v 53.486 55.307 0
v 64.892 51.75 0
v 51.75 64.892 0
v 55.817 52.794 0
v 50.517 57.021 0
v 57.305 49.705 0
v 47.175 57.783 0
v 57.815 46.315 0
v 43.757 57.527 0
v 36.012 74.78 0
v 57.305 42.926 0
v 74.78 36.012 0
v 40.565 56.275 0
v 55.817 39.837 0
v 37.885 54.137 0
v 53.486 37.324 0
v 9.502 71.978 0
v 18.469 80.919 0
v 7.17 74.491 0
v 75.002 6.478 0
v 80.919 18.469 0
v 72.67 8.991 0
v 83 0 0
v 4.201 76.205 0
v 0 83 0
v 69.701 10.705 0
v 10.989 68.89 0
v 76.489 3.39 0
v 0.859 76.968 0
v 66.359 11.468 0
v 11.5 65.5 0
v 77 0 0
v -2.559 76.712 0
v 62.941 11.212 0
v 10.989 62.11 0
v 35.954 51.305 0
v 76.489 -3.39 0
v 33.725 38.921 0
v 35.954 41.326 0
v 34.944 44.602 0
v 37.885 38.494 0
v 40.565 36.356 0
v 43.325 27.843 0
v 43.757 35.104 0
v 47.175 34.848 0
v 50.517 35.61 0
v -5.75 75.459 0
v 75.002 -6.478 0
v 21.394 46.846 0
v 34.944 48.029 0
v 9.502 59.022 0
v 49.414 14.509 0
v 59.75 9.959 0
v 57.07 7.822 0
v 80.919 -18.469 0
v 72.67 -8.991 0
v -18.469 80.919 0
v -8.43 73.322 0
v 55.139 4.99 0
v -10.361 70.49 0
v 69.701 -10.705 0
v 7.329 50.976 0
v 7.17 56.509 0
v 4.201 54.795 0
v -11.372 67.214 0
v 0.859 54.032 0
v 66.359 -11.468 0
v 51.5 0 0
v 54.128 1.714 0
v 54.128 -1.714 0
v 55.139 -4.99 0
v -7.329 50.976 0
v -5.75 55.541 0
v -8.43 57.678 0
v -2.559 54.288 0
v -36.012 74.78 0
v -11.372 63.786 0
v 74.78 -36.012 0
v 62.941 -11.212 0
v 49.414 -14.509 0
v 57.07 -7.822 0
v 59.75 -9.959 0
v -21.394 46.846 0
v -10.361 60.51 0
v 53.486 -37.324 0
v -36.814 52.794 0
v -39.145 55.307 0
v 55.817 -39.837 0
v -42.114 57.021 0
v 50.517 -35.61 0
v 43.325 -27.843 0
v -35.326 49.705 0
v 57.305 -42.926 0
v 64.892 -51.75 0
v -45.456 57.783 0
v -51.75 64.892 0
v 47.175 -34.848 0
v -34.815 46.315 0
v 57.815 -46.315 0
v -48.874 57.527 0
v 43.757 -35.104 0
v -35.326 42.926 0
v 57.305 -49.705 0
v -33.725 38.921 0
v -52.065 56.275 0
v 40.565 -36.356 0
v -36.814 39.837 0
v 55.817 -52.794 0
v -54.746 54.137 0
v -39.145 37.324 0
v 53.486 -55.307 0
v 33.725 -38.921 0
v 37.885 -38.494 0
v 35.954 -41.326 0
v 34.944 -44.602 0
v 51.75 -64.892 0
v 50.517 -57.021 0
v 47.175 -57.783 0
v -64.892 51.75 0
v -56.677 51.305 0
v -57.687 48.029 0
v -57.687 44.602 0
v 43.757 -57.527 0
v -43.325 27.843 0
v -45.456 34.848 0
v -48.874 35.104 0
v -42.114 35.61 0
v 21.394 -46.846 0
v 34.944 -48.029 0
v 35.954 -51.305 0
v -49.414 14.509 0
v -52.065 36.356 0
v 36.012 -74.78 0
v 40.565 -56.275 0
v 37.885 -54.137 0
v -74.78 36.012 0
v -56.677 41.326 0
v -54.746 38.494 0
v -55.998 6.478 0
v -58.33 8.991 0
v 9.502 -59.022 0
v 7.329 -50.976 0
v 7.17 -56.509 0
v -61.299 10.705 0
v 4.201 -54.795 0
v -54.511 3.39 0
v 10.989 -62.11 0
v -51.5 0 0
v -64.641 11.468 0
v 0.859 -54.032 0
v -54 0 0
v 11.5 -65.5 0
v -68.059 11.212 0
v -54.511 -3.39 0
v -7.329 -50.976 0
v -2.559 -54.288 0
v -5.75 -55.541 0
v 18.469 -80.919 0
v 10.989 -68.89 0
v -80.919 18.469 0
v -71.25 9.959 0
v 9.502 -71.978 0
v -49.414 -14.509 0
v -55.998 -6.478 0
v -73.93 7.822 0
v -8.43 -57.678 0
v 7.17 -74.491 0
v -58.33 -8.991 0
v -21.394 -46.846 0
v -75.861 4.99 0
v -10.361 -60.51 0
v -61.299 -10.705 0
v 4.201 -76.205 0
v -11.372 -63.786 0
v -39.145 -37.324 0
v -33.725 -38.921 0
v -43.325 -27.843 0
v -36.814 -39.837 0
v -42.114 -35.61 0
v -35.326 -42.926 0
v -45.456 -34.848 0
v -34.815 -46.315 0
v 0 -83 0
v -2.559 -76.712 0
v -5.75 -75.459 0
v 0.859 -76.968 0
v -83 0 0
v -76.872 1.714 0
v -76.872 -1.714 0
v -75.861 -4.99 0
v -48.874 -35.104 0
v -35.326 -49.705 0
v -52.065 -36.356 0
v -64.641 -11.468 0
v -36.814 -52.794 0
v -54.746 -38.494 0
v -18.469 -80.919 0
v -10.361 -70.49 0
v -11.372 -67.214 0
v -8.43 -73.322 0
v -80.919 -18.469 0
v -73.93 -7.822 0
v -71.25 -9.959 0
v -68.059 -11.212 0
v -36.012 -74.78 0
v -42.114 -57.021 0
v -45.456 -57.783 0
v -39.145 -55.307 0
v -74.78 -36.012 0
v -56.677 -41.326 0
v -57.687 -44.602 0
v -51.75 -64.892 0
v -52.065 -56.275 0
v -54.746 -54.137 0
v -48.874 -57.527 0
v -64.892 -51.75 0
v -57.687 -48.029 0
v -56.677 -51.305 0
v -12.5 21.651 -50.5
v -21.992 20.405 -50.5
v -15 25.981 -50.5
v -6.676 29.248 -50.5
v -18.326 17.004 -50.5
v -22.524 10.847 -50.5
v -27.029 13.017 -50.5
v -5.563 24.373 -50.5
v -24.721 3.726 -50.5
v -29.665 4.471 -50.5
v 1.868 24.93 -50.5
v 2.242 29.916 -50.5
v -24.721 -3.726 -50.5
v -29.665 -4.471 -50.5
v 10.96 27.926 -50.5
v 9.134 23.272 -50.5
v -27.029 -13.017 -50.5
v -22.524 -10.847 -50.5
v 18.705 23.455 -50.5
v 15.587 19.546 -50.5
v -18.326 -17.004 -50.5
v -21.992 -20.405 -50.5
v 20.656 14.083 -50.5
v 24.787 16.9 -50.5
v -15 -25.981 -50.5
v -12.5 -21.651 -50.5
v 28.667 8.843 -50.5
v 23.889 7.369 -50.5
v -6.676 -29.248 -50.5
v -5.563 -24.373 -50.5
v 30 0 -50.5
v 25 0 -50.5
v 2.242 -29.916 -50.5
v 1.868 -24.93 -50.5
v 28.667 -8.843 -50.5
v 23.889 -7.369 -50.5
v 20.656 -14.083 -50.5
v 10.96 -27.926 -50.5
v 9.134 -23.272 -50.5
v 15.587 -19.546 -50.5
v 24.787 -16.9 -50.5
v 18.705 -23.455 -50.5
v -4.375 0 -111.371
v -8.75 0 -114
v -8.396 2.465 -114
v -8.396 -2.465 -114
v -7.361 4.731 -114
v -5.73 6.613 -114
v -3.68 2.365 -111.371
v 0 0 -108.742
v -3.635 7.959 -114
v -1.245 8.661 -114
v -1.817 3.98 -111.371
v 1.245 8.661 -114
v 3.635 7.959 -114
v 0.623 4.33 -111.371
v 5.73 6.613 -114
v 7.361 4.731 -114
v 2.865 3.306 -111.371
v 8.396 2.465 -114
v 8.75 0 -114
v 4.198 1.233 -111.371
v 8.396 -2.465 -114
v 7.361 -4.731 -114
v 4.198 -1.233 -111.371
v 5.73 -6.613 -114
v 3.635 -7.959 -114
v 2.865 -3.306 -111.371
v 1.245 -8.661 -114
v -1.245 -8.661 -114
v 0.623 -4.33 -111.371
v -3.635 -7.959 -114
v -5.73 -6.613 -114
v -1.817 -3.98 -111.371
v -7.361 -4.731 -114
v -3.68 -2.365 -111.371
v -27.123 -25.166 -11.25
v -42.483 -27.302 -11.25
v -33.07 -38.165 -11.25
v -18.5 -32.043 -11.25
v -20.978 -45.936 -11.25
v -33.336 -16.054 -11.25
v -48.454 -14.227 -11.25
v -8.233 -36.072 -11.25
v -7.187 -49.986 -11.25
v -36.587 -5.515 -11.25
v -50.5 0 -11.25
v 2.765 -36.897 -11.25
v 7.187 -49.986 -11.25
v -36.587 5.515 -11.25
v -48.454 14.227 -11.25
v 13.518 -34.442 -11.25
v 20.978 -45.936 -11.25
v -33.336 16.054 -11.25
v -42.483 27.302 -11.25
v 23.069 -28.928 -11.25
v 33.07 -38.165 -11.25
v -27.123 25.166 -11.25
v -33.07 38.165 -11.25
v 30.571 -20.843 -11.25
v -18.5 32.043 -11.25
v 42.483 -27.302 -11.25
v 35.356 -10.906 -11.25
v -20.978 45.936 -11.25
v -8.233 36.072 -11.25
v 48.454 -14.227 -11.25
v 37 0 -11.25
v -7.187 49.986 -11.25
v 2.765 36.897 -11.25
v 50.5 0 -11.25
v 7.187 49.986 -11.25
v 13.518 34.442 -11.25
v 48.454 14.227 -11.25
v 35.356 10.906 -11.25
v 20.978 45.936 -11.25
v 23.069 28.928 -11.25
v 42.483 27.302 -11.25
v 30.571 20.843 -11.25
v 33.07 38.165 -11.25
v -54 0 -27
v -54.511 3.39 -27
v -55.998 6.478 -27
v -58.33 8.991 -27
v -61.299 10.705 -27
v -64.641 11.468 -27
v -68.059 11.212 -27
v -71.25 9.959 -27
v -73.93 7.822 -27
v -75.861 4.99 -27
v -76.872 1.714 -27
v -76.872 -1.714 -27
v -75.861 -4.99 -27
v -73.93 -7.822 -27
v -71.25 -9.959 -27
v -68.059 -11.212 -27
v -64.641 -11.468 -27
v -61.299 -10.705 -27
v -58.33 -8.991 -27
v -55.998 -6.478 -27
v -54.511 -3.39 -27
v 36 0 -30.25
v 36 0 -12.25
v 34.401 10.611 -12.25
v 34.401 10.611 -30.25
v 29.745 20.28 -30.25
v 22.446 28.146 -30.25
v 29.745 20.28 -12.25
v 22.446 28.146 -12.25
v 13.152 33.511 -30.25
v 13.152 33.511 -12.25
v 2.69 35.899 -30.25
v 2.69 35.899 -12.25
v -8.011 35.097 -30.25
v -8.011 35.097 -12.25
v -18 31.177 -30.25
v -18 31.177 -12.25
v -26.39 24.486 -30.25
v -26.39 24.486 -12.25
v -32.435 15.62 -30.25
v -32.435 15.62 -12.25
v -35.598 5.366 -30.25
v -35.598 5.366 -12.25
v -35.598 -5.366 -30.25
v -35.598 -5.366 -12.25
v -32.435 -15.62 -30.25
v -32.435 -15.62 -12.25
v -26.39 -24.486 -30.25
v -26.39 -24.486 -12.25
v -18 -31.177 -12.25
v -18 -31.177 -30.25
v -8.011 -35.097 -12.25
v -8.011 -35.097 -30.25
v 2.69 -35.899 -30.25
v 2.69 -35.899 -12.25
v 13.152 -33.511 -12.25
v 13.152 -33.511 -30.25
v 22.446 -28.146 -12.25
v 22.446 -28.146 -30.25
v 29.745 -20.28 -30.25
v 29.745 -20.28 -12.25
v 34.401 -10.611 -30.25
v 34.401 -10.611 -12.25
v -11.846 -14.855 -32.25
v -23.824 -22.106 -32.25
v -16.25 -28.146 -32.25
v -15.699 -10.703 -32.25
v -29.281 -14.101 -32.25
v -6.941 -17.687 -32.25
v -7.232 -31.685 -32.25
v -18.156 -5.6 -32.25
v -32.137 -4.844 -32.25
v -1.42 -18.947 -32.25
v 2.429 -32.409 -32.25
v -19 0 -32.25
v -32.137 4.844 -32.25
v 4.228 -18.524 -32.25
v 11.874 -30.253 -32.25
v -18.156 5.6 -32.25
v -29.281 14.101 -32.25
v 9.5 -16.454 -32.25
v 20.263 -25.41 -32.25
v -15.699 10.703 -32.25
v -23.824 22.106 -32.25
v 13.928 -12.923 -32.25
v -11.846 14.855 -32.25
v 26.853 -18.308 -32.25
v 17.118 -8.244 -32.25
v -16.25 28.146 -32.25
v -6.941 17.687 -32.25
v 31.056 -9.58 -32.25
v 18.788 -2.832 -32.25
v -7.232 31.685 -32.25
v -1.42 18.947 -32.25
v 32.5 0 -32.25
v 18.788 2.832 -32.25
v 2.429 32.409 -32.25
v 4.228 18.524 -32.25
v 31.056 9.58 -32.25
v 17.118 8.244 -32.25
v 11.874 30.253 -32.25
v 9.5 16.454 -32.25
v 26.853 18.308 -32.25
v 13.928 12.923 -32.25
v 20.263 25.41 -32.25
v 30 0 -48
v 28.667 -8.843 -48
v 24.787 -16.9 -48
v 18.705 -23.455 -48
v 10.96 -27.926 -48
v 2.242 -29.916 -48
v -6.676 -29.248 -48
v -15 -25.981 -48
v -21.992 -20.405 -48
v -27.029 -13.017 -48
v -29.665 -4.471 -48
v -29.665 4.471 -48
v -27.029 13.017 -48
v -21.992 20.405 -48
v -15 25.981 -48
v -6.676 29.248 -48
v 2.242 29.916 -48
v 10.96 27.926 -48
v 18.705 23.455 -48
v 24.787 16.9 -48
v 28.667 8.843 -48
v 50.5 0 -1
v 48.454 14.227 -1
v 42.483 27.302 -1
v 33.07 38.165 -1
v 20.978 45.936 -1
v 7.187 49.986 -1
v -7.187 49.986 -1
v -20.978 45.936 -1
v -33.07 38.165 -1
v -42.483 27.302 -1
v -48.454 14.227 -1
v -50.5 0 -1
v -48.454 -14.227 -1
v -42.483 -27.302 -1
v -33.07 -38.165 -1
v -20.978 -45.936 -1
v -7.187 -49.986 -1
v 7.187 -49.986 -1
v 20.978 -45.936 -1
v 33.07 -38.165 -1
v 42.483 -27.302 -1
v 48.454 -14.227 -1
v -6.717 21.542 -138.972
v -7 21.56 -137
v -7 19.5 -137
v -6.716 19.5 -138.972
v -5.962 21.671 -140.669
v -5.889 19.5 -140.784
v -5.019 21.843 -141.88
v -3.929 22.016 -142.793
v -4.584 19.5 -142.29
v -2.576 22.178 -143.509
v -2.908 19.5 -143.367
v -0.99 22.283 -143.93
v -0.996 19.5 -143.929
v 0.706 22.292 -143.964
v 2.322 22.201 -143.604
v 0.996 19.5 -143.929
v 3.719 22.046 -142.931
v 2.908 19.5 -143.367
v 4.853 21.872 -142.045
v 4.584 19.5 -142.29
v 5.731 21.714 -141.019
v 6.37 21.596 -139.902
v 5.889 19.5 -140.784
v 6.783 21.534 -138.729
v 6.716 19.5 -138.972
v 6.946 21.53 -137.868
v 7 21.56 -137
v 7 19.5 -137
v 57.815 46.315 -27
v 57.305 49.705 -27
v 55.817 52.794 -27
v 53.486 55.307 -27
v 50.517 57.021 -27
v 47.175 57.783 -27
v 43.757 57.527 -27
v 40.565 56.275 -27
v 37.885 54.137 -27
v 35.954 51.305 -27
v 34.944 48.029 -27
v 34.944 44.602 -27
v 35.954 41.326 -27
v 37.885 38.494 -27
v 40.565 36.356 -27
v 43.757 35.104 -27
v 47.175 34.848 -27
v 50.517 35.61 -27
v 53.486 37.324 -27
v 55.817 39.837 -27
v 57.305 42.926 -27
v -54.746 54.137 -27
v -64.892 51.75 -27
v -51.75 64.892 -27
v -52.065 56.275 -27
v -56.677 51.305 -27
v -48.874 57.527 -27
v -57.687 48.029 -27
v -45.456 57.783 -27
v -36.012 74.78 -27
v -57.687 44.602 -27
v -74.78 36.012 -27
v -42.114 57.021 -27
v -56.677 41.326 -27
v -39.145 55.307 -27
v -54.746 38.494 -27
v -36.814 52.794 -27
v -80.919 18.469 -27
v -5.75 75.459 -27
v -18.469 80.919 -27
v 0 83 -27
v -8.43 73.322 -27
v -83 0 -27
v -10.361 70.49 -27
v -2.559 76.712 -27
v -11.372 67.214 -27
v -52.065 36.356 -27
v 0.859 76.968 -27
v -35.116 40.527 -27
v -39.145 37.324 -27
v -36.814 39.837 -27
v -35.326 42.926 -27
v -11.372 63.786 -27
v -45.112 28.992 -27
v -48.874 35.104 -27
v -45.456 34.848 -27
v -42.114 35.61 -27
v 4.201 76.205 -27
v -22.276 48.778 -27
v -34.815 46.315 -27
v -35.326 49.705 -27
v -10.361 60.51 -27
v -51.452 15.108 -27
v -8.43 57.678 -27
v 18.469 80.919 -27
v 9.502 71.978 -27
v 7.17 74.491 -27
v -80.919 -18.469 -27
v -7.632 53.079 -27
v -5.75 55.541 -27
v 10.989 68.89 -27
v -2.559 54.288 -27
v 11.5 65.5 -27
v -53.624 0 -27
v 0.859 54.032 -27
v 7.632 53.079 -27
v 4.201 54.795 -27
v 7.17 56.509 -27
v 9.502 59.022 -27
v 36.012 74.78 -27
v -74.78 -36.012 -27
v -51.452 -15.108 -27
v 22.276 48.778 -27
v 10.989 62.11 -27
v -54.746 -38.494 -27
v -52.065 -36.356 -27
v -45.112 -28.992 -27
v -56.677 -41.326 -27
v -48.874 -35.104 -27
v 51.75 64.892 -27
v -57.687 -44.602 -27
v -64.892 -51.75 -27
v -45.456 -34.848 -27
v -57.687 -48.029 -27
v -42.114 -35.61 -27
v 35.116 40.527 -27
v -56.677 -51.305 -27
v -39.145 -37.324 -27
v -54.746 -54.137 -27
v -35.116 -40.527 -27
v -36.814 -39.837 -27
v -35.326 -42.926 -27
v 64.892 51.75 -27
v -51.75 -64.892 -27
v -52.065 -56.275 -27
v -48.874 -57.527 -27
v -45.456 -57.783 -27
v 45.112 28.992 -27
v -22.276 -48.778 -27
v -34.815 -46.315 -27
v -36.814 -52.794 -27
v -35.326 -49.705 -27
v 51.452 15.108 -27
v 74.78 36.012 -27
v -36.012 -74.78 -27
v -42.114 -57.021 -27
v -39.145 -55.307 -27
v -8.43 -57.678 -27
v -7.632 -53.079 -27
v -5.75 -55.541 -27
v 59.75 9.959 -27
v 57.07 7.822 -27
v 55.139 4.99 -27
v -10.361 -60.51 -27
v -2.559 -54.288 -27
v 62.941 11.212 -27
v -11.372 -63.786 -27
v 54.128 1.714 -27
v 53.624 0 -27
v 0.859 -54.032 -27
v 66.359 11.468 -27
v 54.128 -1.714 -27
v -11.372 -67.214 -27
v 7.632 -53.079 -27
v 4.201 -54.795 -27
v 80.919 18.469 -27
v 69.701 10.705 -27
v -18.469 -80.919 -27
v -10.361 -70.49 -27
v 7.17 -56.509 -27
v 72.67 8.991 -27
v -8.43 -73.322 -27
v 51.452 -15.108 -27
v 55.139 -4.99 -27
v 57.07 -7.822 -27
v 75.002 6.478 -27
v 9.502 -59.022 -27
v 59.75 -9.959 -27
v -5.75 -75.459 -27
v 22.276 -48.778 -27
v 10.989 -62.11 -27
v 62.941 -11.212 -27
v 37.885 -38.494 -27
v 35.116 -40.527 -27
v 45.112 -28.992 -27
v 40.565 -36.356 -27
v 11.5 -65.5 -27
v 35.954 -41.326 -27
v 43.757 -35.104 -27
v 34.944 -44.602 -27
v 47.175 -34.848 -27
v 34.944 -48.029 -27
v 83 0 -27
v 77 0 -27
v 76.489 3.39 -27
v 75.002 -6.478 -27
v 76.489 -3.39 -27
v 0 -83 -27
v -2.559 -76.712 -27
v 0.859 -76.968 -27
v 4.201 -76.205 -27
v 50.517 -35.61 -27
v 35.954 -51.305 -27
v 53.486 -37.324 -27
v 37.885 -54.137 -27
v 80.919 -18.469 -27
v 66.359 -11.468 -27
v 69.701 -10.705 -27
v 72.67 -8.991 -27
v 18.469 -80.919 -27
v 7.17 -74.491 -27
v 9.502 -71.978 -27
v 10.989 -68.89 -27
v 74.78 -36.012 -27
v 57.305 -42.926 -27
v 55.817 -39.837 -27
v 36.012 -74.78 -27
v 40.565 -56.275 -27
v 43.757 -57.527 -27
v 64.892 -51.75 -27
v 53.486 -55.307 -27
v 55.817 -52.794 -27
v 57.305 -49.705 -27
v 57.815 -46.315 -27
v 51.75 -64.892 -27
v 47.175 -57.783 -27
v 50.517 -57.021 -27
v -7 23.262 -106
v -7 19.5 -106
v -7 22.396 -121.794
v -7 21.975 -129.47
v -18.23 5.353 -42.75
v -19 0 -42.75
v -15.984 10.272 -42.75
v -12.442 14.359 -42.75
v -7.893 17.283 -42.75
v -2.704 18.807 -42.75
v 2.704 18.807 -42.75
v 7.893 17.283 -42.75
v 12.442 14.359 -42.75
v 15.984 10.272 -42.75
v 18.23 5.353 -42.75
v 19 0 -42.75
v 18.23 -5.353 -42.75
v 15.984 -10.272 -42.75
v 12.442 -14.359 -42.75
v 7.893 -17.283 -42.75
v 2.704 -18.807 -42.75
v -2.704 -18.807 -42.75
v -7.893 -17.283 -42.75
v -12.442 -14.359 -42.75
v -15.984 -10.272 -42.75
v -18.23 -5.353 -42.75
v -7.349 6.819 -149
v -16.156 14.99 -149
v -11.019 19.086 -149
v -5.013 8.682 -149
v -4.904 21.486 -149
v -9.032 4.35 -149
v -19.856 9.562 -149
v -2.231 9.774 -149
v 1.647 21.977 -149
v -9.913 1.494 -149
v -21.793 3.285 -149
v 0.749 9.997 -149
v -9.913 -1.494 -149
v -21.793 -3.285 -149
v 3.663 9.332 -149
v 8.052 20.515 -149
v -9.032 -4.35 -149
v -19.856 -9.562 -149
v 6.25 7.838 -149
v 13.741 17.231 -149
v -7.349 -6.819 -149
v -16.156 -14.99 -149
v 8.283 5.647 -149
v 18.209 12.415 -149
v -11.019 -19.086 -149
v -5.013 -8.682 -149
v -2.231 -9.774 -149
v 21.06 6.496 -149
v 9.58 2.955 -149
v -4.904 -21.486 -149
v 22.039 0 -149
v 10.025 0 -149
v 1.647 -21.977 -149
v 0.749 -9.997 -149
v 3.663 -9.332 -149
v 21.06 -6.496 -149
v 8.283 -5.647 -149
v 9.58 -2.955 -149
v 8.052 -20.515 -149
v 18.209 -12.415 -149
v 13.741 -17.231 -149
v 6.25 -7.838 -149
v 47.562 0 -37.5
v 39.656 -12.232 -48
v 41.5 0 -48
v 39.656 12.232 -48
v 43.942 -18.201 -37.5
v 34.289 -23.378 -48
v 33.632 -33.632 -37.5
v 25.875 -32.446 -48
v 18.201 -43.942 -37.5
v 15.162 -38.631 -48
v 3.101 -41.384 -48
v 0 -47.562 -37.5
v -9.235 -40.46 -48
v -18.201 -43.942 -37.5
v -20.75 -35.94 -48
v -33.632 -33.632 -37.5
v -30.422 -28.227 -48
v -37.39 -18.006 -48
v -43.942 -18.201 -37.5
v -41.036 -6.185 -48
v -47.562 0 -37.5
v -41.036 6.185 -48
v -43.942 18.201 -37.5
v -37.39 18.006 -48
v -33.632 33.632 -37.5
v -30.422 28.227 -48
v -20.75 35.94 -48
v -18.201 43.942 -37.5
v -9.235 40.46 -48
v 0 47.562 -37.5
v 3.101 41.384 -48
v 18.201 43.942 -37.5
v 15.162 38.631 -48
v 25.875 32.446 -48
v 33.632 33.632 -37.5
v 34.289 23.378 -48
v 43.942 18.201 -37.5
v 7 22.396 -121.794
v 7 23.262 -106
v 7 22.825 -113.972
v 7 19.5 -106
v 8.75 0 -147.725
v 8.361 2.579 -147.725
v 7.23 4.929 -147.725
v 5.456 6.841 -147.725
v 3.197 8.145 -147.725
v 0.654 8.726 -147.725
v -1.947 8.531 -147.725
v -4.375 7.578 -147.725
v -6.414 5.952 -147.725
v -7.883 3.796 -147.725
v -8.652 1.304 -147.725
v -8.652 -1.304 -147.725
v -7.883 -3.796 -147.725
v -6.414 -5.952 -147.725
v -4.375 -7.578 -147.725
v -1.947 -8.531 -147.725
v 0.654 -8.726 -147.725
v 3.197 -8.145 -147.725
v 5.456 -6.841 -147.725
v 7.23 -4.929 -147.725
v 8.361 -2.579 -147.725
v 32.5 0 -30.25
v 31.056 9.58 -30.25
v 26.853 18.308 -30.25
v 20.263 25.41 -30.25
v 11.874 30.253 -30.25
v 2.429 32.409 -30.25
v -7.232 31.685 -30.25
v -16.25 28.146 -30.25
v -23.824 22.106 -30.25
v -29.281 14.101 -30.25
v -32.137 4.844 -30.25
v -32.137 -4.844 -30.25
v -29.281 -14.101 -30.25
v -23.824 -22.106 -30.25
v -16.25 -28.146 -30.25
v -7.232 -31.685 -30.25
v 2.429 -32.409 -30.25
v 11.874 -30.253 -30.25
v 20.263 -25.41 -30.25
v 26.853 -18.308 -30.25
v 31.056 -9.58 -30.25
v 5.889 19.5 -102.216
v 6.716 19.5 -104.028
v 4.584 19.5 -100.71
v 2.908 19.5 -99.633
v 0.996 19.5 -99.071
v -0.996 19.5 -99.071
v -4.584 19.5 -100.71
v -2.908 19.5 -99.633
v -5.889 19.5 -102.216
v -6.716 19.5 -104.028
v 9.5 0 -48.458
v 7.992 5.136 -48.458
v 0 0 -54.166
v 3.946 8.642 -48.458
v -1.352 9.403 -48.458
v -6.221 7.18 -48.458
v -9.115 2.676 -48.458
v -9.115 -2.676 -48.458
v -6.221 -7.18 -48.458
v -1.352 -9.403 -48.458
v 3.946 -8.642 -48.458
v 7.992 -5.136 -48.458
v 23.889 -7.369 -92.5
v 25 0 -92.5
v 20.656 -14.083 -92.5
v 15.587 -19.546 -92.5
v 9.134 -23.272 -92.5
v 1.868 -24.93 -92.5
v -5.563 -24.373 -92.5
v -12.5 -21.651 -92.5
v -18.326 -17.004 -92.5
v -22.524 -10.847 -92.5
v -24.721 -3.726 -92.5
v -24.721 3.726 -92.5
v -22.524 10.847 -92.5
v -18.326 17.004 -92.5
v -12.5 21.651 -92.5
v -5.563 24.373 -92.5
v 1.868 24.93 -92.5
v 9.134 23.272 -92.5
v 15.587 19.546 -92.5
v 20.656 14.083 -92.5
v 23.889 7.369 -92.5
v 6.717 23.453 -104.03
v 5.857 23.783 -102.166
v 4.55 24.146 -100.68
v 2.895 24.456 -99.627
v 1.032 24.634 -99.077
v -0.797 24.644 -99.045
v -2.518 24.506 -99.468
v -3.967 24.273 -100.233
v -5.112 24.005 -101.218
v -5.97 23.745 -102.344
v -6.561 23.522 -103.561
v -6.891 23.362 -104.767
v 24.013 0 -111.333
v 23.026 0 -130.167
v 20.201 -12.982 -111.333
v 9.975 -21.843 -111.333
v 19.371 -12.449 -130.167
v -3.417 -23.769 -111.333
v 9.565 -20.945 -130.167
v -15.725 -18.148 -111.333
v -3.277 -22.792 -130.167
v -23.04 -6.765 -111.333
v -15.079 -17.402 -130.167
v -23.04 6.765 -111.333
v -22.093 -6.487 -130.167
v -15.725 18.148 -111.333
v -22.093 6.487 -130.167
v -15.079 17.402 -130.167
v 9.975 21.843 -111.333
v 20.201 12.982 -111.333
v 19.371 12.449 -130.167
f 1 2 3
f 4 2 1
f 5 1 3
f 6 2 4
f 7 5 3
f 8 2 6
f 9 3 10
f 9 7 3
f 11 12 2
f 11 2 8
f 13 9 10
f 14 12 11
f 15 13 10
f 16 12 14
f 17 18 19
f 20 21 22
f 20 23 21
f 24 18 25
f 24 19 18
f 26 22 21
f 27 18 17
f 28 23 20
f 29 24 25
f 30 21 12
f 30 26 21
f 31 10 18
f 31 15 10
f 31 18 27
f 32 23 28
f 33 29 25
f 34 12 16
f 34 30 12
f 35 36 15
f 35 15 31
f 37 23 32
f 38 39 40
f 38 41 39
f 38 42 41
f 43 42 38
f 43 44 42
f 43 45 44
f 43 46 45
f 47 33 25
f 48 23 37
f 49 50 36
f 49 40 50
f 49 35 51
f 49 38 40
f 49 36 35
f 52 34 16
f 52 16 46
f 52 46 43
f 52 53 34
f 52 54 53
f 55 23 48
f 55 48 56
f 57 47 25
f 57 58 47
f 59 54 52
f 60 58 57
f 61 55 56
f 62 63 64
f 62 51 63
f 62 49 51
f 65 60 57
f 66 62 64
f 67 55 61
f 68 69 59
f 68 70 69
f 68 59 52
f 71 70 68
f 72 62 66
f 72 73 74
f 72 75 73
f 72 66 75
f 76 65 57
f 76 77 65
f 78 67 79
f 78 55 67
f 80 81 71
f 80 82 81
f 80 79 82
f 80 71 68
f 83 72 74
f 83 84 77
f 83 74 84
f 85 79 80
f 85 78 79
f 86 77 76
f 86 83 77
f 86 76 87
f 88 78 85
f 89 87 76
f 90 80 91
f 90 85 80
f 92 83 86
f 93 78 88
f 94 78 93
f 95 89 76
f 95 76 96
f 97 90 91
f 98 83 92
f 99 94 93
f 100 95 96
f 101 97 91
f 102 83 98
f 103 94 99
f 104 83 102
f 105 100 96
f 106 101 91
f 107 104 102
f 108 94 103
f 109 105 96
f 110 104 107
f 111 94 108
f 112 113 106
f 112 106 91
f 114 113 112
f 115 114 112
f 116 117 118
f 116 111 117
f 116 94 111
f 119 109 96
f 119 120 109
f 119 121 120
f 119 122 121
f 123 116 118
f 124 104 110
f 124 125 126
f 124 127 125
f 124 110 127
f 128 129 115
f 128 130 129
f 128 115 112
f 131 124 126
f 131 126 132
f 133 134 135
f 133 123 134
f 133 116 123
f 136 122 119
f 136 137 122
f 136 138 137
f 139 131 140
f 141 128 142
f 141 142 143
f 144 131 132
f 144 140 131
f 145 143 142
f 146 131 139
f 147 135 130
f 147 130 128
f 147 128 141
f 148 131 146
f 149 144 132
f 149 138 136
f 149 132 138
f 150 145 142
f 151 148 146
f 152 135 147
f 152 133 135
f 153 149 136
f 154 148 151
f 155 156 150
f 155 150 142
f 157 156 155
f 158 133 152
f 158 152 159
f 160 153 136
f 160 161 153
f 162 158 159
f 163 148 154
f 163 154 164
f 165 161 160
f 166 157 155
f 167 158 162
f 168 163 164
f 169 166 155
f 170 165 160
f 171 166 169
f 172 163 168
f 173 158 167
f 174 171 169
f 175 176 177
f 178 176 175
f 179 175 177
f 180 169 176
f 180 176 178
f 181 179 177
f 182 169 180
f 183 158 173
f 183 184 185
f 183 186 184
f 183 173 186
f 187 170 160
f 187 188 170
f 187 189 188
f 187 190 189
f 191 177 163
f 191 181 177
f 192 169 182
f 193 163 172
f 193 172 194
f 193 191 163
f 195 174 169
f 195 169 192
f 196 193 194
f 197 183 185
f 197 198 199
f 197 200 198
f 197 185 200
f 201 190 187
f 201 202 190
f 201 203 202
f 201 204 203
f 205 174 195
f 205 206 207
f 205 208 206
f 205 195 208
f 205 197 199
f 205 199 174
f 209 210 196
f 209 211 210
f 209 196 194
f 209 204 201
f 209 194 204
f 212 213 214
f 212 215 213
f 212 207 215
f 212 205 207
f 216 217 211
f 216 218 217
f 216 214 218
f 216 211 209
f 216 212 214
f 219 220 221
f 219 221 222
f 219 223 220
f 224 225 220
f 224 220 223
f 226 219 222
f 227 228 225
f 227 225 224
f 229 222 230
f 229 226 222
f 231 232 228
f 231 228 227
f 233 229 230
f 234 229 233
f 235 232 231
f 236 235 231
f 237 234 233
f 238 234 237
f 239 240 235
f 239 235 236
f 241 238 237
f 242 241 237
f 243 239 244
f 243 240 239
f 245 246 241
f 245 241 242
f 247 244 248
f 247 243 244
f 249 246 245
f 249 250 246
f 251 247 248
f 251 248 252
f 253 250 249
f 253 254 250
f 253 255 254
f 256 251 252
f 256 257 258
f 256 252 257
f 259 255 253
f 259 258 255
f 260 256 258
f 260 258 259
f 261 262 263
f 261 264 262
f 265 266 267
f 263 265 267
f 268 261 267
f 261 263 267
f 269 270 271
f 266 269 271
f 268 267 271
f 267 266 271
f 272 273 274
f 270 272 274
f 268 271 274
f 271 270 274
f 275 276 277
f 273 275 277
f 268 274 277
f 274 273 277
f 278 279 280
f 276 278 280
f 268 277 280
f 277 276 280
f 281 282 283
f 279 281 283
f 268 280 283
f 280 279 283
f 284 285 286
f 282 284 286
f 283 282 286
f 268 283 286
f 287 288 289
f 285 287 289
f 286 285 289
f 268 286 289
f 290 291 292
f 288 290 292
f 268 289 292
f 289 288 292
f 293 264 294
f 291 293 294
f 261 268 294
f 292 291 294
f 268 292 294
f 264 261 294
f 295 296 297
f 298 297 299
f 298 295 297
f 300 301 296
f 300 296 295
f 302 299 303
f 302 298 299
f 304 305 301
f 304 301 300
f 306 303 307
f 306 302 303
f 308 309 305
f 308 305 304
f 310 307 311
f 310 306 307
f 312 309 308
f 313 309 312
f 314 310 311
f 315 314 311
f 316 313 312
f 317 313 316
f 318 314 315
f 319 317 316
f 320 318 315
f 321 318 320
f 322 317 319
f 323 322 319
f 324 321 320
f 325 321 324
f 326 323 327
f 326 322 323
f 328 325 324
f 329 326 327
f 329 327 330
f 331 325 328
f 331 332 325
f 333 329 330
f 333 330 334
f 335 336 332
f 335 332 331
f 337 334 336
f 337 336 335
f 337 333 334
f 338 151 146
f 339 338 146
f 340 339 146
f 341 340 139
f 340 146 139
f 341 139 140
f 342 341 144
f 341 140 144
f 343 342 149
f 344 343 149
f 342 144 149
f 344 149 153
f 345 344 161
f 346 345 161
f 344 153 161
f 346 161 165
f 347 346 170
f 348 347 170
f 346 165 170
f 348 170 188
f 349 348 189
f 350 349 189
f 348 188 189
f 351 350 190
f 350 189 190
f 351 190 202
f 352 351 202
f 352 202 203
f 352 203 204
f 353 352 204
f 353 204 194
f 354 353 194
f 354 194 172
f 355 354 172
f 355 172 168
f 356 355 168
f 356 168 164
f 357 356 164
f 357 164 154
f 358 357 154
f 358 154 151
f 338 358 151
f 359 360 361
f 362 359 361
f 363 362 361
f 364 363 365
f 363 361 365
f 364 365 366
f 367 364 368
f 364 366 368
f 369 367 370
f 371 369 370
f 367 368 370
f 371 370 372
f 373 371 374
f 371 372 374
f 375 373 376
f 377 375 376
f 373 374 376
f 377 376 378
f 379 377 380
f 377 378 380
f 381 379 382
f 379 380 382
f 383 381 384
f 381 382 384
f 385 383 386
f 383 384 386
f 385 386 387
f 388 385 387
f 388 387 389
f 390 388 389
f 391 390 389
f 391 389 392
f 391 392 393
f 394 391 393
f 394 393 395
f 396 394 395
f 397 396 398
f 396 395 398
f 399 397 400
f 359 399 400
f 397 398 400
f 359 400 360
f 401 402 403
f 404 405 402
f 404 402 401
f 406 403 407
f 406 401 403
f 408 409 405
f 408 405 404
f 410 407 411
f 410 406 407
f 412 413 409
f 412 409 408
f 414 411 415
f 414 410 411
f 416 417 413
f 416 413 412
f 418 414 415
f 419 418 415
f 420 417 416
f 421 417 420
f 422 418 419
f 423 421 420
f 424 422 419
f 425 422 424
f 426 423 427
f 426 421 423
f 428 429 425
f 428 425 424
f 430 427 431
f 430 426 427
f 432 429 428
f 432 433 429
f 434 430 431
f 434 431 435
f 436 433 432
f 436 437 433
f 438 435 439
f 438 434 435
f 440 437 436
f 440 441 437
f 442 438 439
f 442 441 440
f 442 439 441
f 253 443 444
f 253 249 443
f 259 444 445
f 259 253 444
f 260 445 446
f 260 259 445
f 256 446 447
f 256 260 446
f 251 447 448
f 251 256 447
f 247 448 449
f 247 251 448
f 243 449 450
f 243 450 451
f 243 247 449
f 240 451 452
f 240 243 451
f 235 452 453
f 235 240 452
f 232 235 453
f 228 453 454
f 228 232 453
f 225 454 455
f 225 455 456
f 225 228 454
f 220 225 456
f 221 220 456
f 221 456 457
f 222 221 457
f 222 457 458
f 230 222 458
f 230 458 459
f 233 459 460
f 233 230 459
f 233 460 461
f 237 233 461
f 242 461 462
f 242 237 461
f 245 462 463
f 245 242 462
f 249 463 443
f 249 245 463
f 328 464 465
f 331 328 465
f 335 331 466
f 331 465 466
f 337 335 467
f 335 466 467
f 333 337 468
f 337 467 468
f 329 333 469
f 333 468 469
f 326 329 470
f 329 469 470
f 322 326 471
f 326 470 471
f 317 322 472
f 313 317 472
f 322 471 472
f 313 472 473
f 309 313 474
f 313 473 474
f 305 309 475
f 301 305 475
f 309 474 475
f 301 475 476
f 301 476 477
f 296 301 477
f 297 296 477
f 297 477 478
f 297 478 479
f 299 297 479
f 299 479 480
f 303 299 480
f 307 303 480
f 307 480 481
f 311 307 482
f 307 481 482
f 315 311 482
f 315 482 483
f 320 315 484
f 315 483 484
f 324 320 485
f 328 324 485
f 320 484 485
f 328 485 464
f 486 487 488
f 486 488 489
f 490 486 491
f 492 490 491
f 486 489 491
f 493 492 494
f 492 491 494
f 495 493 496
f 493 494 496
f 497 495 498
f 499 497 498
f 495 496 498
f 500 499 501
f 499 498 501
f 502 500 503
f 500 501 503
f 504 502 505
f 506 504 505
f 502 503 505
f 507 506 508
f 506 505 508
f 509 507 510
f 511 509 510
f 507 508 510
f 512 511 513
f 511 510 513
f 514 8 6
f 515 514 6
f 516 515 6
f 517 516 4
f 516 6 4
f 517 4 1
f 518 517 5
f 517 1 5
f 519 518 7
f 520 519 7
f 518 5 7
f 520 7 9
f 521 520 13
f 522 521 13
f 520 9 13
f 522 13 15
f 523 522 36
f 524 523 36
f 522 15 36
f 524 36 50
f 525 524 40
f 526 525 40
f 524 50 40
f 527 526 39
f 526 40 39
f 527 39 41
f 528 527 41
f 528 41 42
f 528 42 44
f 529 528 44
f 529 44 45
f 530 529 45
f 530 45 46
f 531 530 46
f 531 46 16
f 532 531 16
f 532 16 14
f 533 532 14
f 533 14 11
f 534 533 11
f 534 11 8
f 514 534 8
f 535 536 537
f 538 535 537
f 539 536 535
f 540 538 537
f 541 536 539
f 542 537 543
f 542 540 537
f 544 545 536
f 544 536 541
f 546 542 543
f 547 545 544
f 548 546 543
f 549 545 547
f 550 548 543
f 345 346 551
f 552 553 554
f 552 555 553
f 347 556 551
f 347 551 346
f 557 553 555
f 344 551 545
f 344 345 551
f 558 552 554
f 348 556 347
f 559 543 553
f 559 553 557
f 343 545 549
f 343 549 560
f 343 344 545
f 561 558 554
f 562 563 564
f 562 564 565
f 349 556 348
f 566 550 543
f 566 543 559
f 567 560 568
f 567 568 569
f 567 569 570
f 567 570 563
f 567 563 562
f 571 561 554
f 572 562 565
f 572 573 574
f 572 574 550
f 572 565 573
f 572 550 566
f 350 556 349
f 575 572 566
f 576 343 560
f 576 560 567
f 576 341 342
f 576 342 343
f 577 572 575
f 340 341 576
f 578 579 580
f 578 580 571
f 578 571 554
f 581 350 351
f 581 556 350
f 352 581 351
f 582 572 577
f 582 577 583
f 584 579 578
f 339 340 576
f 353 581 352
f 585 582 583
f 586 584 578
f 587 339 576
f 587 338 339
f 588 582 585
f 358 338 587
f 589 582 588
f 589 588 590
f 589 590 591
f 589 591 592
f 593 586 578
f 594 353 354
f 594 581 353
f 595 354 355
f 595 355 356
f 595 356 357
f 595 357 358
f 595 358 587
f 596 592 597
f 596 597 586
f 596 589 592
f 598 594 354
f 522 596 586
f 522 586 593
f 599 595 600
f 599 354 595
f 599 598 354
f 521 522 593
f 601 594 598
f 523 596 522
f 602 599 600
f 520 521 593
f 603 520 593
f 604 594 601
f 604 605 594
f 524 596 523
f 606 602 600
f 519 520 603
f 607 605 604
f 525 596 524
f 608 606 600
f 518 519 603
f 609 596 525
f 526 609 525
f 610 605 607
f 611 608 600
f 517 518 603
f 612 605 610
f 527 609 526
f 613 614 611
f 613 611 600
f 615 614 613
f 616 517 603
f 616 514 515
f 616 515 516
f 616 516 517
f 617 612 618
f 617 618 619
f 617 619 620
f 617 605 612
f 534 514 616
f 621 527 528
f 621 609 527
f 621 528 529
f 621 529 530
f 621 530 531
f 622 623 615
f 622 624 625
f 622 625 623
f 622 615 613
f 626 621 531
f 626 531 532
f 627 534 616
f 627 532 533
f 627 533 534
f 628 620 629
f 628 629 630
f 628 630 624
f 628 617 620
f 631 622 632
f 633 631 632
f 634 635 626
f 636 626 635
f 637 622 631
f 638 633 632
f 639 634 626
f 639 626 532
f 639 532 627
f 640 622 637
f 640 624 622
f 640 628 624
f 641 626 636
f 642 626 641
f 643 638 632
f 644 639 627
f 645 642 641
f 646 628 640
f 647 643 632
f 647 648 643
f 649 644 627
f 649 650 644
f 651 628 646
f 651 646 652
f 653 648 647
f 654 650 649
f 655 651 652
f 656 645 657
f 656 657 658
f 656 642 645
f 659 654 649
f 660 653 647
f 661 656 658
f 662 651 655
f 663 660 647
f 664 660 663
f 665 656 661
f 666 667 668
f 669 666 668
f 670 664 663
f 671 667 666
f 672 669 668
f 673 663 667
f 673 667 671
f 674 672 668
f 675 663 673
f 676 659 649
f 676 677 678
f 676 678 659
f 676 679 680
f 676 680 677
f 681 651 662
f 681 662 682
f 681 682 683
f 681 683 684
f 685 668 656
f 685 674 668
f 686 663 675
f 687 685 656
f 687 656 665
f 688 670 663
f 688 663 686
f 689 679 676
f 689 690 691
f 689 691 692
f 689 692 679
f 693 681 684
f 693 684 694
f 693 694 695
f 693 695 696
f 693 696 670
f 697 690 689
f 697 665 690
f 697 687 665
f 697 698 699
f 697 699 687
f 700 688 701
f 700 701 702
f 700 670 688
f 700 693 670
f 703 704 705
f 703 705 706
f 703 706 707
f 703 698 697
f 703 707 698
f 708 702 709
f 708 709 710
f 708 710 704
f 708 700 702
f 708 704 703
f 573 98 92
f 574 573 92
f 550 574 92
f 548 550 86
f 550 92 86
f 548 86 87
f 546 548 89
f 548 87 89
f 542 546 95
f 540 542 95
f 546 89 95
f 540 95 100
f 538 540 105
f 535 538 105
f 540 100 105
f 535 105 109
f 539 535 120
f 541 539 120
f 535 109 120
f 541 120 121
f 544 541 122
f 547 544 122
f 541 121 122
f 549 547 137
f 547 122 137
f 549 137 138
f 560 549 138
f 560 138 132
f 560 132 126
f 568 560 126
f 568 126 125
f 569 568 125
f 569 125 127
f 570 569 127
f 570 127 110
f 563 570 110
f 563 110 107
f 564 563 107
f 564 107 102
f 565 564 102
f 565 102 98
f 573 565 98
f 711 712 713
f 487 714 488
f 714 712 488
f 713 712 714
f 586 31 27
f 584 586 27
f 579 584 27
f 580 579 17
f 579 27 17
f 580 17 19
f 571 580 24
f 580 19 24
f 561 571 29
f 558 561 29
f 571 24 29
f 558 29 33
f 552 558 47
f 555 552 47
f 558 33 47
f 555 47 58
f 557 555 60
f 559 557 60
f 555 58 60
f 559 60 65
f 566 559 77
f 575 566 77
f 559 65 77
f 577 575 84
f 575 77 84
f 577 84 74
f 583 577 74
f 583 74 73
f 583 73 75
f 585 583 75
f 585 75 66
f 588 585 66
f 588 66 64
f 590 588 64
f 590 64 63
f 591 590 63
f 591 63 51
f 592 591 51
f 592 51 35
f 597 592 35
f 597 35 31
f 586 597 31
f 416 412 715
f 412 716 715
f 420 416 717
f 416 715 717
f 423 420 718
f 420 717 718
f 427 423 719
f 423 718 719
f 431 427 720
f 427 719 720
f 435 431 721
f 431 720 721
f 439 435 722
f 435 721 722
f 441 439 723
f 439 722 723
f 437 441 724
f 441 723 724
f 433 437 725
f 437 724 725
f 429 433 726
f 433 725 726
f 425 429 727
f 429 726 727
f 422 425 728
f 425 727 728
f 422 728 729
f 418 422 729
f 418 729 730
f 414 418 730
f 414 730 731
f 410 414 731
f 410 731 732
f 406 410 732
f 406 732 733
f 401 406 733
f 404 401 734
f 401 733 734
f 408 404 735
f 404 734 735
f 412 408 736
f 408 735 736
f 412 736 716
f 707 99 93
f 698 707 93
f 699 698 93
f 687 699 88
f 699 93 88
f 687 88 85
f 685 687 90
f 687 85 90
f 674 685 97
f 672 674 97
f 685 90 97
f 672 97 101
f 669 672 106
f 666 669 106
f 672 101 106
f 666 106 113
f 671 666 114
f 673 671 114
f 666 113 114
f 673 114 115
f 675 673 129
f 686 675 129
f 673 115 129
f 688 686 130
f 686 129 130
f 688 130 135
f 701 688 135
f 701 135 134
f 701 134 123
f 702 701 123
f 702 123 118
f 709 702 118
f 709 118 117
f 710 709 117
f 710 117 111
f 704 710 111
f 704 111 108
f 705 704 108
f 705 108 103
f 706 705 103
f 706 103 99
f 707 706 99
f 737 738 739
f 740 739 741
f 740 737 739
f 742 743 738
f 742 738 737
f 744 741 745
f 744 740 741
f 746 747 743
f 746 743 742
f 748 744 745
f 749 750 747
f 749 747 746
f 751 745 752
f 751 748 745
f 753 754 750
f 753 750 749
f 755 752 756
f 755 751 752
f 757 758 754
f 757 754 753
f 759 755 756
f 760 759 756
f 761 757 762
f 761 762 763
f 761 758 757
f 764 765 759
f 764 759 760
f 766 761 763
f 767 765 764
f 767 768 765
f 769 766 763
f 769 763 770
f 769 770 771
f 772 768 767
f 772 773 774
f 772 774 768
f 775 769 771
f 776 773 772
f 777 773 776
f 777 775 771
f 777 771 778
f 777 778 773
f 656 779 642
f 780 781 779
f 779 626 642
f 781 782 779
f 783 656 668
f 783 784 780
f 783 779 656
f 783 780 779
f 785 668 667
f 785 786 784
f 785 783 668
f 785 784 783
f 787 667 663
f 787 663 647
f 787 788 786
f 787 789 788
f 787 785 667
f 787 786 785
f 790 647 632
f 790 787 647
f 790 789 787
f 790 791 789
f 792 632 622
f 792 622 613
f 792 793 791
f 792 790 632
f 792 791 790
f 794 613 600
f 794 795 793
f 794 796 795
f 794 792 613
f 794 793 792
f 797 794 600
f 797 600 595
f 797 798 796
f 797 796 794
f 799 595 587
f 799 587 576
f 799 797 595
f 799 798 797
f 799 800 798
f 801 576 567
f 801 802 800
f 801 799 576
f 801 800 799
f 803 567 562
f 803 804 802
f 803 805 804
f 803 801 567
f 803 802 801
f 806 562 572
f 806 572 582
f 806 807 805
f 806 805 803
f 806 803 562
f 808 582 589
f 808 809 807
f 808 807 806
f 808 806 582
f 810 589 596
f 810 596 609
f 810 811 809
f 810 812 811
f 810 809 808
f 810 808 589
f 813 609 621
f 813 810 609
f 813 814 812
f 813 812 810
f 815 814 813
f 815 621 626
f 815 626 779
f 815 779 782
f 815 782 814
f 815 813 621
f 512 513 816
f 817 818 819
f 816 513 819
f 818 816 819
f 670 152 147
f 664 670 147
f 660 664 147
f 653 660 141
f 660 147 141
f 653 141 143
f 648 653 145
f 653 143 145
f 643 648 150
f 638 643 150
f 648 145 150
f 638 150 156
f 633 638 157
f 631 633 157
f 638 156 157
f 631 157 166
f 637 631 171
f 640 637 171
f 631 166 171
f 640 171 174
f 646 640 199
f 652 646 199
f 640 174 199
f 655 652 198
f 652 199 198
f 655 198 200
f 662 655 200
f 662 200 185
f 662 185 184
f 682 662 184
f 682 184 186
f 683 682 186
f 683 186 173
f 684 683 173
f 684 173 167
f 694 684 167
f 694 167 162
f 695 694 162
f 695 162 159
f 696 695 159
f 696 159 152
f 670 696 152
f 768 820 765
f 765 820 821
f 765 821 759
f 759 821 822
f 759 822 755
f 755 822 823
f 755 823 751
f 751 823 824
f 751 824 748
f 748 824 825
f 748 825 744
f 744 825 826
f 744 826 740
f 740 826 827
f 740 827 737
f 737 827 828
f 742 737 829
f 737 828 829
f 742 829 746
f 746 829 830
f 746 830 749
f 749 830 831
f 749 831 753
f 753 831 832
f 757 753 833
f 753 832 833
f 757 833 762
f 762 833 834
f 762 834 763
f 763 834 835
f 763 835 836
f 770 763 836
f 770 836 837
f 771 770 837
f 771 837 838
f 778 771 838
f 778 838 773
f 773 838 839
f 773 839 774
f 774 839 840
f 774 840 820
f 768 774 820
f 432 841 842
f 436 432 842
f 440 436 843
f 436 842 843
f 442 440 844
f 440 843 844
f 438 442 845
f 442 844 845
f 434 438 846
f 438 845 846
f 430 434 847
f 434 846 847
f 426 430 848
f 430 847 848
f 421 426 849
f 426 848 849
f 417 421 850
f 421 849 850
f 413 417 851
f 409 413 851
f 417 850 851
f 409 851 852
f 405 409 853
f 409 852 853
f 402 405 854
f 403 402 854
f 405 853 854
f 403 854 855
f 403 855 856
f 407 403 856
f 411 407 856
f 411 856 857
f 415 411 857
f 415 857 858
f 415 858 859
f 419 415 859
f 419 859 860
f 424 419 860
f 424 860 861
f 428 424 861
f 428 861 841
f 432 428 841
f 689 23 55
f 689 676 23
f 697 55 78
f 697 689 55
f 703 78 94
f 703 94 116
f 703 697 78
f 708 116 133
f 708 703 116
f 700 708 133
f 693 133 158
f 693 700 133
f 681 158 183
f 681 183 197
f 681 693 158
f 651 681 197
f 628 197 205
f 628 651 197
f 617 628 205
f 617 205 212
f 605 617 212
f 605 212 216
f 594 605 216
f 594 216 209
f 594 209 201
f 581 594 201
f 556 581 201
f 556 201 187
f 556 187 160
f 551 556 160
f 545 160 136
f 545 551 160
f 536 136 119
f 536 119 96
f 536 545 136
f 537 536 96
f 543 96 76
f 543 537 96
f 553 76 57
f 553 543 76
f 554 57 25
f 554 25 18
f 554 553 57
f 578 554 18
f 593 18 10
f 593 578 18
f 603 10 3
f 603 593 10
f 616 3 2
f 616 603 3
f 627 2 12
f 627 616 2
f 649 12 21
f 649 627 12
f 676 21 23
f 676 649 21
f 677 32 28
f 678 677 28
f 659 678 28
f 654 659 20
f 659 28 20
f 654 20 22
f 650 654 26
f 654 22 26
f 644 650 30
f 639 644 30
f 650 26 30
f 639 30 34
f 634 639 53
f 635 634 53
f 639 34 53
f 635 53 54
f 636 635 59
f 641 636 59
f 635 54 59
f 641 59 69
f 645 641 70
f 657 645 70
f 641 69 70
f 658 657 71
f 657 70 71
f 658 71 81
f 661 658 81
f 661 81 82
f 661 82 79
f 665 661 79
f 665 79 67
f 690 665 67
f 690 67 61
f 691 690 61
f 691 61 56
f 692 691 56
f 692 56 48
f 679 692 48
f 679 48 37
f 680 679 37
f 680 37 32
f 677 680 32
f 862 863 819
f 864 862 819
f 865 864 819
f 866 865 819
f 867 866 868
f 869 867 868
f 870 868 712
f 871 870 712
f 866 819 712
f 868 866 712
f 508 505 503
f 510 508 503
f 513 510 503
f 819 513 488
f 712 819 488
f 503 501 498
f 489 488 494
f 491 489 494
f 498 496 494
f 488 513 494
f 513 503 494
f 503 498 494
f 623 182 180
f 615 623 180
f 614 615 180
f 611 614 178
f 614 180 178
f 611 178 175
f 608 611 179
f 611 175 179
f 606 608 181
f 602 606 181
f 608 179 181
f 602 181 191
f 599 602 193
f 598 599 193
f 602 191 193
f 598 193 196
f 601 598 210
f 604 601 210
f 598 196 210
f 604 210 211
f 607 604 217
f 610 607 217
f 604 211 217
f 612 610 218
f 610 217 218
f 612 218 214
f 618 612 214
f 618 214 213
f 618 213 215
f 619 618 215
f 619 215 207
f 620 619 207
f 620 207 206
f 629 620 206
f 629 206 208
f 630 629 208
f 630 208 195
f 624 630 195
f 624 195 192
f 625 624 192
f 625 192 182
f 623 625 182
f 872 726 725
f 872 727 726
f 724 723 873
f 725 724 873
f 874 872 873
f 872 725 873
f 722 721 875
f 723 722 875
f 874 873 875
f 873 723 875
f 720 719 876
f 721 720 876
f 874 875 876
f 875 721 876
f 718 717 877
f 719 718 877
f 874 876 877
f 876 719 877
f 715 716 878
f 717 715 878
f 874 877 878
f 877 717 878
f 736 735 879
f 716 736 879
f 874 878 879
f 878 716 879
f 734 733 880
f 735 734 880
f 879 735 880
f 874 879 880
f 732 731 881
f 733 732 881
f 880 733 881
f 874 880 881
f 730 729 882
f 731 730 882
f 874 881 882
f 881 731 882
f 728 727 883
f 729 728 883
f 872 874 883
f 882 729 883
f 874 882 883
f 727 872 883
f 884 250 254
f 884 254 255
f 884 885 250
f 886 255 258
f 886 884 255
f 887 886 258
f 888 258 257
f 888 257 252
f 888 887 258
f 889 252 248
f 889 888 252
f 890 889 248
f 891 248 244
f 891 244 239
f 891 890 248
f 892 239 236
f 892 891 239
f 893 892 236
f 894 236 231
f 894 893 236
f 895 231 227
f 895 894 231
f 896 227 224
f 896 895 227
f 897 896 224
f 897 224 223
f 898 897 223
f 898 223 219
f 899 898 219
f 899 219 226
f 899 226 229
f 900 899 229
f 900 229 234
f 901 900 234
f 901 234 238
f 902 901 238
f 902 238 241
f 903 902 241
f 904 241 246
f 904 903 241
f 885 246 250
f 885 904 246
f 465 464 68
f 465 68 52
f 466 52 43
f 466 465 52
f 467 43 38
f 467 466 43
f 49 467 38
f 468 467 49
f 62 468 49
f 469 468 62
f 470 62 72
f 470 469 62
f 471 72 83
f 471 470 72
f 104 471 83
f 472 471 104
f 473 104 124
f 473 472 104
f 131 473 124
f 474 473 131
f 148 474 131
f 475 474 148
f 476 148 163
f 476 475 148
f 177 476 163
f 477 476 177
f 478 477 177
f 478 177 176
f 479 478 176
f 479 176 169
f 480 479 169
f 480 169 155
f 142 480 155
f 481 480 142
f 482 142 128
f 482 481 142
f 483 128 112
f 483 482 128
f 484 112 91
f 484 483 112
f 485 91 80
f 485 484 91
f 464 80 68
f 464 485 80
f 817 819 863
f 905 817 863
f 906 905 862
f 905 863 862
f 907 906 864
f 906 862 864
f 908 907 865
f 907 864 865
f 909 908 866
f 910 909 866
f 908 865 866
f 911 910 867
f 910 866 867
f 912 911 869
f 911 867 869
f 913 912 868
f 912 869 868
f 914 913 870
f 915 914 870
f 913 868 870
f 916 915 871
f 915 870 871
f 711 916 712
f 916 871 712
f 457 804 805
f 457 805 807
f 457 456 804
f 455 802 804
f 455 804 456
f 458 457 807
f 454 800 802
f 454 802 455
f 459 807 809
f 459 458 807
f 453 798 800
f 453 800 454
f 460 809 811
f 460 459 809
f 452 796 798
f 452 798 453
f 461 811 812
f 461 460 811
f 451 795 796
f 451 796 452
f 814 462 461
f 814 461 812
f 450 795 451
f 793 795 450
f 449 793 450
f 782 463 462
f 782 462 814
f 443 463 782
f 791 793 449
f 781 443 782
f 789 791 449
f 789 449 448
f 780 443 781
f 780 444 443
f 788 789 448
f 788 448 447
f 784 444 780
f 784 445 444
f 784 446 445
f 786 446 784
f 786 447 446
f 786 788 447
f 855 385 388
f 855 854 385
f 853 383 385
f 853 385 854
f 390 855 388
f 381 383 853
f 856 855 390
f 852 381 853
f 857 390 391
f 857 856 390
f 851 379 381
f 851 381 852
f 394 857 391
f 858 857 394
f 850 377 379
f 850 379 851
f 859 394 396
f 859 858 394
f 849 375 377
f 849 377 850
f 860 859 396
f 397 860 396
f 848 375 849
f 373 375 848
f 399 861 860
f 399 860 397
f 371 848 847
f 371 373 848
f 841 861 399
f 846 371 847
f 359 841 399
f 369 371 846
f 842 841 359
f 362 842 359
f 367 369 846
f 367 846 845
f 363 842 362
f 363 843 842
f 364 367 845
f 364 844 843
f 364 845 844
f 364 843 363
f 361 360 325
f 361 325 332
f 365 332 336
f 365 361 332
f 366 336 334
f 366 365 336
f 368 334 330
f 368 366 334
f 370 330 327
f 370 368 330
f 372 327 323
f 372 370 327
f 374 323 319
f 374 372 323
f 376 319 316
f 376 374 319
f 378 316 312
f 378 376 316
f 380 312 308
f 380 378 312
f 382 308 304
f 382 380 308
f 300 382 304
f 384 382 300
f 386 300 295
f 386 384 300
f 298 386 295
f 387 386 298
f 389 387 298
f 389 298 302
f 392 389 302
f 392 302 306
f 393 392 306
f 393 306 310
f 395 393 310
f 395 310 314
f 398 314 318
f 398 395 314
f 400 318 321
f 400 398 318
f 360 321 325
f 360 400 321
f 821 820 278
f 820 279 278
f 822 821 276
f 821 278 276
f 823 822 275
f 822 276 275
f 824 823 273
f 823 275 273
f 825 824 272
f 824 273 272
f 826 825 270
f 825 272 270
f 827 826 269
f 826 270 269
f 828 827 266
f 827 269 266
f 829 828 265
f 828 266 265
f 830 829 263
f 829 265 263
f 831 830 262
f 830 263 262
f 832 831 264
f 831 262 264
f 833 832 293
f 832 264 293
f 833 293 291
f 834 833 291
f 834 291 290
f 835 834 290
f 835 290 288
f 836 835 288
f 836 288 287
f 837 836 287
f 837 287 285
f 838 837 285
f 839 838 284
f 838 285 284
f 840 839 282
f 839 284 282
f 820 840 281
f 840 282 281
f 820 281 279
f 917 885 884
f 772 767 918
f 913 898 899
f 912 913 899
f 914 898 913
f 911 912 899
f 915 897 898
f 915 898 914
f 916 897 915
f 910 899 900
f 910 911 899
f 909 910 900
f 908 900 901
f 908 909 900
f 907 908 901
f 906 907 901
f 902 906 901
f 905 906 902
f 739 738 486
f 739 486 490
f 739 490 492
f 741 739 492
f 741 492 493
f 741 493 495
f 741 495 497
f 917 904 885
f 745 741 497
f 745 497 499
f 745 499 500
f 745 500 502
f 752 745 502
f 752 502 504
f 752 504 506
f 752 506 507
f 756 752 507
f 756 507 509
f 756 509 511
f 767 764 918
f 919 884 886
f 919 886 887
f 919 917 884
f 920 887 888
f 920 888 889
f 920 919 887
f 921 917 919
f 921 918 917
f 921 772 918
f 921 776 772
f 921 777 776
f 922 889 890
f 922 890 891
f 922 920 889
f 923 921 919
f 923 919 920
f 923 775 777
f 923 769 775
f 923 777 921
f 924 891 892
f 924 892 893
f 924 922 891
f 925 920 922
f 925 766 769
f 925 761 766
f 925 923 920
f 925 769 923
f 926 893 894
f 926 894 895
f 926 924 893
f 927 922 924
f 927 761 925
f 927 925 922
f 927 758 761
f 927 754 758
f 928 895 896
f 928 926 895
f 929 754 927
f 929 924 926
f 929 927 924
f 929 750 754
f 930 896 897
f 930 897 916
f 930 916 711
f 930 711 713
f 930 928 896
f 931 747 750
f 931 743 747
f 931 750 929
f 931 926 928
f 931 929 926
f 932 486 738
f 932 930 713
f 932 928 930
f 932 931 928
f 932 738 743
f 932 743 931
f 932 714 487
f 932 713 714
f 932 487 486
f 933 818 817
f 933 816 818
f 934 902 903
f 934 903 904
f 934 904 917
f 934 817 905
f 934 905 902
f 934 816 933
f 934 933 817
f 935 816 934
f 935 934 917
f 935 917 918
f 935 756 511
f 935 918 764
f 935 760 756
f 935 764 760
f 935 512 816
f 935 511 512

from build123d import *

# Parameters (mm, degrees)
HOLE_WIZARD_M20_1_D           = 17.5
HOLE_WIZARD_M20_1_DEPTH       = 35
HOLE_WIZARD_M20_1_CSINK_D     = 20.05
HOLE_WIZARD_M20_1_CSINK_ANGLE = 90
HOLE_WIZARD_M20_1_TIP         = 5.257530416
CUT_EXTRUDE_START             = 19.5
CUT_EXTRUDE_1_DEPTH           = 171.181311678
SKETCH_5_R                    = 50.5
CUT_EXTRUDE_2_DEPTH           = 11.25
SKETCH_6_R                    = 36
CUT_EXTRUDE_3_DEPTH           = 19
SKETCH_7_R                    = 32.5
CUT_EXTRUDE_4_DEPTH           = 32.25
CHAMFER_1_SIZE                = 1
HOLE_WIZARD_1_D               = 38
HOLE_WIZARD_1_DEPTH           = 42.75
HOLE_WIZARD_1_TIP             = 11.416351762
HOLE_WIZARD_2_D               = 23


with BuildPart() as part:
    # 草图1 → 旋转1 (revolve)
    with BuildSketch(Plane(origin=(0, 0, 0), x_dir=(0, 0, -1), z_dir=(1, 0, 0)), mode=Mode.PRIVATE) as revolve_1_sk:
        Polygon((0, 0), (0, 83), (27, 83), (27, 53.624355653), (48, 41.5), (48, 30), (50.5, 30), (50.5, 25), (92.5, 25), (149, 22.038960471), (149, 0), align=None)
    revolve(revolve_1_sk.sketch.rotate(Axis((0, 0, 0), (0, 0, -1)), 90), axis=Axis((0, 0, 0), (0, 0, -1)))

    # M20 螺纹孔1
    with Locations(Plane(origin=(0, 0, -149), x_dir=(-1, 0, 0), z_dir=(0, 0, -1))):
        with Locations((0, 0)):
            CounterSinkHole(HOLE_WIZARD_M20_1_D / 2, HOLE_WIZARD_M20_1_CSINK_D / 2, depth=HOLE_WIZARD_M20_1_DEPTH, counter_sink_angle=HOLE_WIZARD_M20_1_CSINK_ANGLE)
            with Locations((0, 0, -(HOLE_WIZARD_M20_1_DEPTH + HOLE_WIZARD_M20_1_TIP / 2))):  # 118° drill point
                Cone(0, HOLE_WIZARD_M20_1_D / 2, HOLE_WIZARD_M20_1_TIP, mode=Mode.SUBTRACT)

    # 草图4 → 切除-拉伸1 (cut, through all)
    with BuildSketch(Plane(origin=(0, 0, 0), x_dir=(1, 0, 0), z_dir=(0, 1, 0)).offset(CUT_EXTRUDE_START)):
        with BuildLine():
            Line((7, 137), (7, 106))
            ThreePointArc((7, 106), (0, 99), (-7, 106))
            Line((-7, 106), (-7, 137))
            ThreePointArc((-7, 137), (0, 144), (7, 137))
        make_face()
    extrude(amount=CUT_EXTRUDE_1_DEPTH, mode=Mode.SUBTRACT)

    # 草图5 → 切除-拉伸2 (cut)
    with BuildSketch(Plane.XY):
        Circle(SKETCH_5_R)
    extrude(amount=-CUT_EXTRUDE_2_DEPTH, mode=Mode.SUBTRACT)

    # 草图6 → 切除-拉伸3 (cut)
    with BuildSketch(Plane.XY.offset(-11.25)):
        Circle(SKETCH_6_R)
    extrude(amount=-CUT_EXTRUDE_3_DEPTH, mode=Mode.SUBTRACT)

    # 草图7 → 切除-拉伸4 (cut)
    with BuildSketch(Plane.XY):
        Circle(SKETCH_7_R)
    extrude(amount=-CUT_EXTRUDE_4_DEPTH, mode=Mode.SUBTRACT)

    # 倒角1
    chamfer_1_edges = [part.edges().sort_by_distance(p)[0] for p in [
        (-50.5, 0, 0),
        (-36, 0, -11.25),
    ]]
    chamfer(chamfer_1_edges, length=CHAMFER_1_SIZE)

    # 孔1
    with Locations(Plane.XY):
        with Locations((0, 0)):
            Hole(HOLE_WIZARD_1_D / 2, depth=HOLE_WIZARD_1_DEPTH)
            with Locations((0, 0, -(HOLE_WIZARD_1_DEPTH + HOLE_WIZARD_1_TIP / 2))):  # 118° drill point
                Cone(0, HOLE_WIZARD_1_D / 2, HOLE_WIZARD_1_TIP, mode=Mode.SUBTRACT)

    # 孔2 (through all)
    with Locations(Plane(origin=(0, 0, -27), x_dir=(-1, 0, 0), z_dir=(0, 0, -1))):
        with Locations((-46.315494168, 46.315494168), (0, 65.5), (46.315494168, 46.315494168), (65.5, 0), (46.315494168, -46.315494168), (0, -65.5), (-46.315494168, -46.315494168), (-65.5, 0)):
            Hole(HOLE_WIZARD_2_D / 2)


solid = part.part
